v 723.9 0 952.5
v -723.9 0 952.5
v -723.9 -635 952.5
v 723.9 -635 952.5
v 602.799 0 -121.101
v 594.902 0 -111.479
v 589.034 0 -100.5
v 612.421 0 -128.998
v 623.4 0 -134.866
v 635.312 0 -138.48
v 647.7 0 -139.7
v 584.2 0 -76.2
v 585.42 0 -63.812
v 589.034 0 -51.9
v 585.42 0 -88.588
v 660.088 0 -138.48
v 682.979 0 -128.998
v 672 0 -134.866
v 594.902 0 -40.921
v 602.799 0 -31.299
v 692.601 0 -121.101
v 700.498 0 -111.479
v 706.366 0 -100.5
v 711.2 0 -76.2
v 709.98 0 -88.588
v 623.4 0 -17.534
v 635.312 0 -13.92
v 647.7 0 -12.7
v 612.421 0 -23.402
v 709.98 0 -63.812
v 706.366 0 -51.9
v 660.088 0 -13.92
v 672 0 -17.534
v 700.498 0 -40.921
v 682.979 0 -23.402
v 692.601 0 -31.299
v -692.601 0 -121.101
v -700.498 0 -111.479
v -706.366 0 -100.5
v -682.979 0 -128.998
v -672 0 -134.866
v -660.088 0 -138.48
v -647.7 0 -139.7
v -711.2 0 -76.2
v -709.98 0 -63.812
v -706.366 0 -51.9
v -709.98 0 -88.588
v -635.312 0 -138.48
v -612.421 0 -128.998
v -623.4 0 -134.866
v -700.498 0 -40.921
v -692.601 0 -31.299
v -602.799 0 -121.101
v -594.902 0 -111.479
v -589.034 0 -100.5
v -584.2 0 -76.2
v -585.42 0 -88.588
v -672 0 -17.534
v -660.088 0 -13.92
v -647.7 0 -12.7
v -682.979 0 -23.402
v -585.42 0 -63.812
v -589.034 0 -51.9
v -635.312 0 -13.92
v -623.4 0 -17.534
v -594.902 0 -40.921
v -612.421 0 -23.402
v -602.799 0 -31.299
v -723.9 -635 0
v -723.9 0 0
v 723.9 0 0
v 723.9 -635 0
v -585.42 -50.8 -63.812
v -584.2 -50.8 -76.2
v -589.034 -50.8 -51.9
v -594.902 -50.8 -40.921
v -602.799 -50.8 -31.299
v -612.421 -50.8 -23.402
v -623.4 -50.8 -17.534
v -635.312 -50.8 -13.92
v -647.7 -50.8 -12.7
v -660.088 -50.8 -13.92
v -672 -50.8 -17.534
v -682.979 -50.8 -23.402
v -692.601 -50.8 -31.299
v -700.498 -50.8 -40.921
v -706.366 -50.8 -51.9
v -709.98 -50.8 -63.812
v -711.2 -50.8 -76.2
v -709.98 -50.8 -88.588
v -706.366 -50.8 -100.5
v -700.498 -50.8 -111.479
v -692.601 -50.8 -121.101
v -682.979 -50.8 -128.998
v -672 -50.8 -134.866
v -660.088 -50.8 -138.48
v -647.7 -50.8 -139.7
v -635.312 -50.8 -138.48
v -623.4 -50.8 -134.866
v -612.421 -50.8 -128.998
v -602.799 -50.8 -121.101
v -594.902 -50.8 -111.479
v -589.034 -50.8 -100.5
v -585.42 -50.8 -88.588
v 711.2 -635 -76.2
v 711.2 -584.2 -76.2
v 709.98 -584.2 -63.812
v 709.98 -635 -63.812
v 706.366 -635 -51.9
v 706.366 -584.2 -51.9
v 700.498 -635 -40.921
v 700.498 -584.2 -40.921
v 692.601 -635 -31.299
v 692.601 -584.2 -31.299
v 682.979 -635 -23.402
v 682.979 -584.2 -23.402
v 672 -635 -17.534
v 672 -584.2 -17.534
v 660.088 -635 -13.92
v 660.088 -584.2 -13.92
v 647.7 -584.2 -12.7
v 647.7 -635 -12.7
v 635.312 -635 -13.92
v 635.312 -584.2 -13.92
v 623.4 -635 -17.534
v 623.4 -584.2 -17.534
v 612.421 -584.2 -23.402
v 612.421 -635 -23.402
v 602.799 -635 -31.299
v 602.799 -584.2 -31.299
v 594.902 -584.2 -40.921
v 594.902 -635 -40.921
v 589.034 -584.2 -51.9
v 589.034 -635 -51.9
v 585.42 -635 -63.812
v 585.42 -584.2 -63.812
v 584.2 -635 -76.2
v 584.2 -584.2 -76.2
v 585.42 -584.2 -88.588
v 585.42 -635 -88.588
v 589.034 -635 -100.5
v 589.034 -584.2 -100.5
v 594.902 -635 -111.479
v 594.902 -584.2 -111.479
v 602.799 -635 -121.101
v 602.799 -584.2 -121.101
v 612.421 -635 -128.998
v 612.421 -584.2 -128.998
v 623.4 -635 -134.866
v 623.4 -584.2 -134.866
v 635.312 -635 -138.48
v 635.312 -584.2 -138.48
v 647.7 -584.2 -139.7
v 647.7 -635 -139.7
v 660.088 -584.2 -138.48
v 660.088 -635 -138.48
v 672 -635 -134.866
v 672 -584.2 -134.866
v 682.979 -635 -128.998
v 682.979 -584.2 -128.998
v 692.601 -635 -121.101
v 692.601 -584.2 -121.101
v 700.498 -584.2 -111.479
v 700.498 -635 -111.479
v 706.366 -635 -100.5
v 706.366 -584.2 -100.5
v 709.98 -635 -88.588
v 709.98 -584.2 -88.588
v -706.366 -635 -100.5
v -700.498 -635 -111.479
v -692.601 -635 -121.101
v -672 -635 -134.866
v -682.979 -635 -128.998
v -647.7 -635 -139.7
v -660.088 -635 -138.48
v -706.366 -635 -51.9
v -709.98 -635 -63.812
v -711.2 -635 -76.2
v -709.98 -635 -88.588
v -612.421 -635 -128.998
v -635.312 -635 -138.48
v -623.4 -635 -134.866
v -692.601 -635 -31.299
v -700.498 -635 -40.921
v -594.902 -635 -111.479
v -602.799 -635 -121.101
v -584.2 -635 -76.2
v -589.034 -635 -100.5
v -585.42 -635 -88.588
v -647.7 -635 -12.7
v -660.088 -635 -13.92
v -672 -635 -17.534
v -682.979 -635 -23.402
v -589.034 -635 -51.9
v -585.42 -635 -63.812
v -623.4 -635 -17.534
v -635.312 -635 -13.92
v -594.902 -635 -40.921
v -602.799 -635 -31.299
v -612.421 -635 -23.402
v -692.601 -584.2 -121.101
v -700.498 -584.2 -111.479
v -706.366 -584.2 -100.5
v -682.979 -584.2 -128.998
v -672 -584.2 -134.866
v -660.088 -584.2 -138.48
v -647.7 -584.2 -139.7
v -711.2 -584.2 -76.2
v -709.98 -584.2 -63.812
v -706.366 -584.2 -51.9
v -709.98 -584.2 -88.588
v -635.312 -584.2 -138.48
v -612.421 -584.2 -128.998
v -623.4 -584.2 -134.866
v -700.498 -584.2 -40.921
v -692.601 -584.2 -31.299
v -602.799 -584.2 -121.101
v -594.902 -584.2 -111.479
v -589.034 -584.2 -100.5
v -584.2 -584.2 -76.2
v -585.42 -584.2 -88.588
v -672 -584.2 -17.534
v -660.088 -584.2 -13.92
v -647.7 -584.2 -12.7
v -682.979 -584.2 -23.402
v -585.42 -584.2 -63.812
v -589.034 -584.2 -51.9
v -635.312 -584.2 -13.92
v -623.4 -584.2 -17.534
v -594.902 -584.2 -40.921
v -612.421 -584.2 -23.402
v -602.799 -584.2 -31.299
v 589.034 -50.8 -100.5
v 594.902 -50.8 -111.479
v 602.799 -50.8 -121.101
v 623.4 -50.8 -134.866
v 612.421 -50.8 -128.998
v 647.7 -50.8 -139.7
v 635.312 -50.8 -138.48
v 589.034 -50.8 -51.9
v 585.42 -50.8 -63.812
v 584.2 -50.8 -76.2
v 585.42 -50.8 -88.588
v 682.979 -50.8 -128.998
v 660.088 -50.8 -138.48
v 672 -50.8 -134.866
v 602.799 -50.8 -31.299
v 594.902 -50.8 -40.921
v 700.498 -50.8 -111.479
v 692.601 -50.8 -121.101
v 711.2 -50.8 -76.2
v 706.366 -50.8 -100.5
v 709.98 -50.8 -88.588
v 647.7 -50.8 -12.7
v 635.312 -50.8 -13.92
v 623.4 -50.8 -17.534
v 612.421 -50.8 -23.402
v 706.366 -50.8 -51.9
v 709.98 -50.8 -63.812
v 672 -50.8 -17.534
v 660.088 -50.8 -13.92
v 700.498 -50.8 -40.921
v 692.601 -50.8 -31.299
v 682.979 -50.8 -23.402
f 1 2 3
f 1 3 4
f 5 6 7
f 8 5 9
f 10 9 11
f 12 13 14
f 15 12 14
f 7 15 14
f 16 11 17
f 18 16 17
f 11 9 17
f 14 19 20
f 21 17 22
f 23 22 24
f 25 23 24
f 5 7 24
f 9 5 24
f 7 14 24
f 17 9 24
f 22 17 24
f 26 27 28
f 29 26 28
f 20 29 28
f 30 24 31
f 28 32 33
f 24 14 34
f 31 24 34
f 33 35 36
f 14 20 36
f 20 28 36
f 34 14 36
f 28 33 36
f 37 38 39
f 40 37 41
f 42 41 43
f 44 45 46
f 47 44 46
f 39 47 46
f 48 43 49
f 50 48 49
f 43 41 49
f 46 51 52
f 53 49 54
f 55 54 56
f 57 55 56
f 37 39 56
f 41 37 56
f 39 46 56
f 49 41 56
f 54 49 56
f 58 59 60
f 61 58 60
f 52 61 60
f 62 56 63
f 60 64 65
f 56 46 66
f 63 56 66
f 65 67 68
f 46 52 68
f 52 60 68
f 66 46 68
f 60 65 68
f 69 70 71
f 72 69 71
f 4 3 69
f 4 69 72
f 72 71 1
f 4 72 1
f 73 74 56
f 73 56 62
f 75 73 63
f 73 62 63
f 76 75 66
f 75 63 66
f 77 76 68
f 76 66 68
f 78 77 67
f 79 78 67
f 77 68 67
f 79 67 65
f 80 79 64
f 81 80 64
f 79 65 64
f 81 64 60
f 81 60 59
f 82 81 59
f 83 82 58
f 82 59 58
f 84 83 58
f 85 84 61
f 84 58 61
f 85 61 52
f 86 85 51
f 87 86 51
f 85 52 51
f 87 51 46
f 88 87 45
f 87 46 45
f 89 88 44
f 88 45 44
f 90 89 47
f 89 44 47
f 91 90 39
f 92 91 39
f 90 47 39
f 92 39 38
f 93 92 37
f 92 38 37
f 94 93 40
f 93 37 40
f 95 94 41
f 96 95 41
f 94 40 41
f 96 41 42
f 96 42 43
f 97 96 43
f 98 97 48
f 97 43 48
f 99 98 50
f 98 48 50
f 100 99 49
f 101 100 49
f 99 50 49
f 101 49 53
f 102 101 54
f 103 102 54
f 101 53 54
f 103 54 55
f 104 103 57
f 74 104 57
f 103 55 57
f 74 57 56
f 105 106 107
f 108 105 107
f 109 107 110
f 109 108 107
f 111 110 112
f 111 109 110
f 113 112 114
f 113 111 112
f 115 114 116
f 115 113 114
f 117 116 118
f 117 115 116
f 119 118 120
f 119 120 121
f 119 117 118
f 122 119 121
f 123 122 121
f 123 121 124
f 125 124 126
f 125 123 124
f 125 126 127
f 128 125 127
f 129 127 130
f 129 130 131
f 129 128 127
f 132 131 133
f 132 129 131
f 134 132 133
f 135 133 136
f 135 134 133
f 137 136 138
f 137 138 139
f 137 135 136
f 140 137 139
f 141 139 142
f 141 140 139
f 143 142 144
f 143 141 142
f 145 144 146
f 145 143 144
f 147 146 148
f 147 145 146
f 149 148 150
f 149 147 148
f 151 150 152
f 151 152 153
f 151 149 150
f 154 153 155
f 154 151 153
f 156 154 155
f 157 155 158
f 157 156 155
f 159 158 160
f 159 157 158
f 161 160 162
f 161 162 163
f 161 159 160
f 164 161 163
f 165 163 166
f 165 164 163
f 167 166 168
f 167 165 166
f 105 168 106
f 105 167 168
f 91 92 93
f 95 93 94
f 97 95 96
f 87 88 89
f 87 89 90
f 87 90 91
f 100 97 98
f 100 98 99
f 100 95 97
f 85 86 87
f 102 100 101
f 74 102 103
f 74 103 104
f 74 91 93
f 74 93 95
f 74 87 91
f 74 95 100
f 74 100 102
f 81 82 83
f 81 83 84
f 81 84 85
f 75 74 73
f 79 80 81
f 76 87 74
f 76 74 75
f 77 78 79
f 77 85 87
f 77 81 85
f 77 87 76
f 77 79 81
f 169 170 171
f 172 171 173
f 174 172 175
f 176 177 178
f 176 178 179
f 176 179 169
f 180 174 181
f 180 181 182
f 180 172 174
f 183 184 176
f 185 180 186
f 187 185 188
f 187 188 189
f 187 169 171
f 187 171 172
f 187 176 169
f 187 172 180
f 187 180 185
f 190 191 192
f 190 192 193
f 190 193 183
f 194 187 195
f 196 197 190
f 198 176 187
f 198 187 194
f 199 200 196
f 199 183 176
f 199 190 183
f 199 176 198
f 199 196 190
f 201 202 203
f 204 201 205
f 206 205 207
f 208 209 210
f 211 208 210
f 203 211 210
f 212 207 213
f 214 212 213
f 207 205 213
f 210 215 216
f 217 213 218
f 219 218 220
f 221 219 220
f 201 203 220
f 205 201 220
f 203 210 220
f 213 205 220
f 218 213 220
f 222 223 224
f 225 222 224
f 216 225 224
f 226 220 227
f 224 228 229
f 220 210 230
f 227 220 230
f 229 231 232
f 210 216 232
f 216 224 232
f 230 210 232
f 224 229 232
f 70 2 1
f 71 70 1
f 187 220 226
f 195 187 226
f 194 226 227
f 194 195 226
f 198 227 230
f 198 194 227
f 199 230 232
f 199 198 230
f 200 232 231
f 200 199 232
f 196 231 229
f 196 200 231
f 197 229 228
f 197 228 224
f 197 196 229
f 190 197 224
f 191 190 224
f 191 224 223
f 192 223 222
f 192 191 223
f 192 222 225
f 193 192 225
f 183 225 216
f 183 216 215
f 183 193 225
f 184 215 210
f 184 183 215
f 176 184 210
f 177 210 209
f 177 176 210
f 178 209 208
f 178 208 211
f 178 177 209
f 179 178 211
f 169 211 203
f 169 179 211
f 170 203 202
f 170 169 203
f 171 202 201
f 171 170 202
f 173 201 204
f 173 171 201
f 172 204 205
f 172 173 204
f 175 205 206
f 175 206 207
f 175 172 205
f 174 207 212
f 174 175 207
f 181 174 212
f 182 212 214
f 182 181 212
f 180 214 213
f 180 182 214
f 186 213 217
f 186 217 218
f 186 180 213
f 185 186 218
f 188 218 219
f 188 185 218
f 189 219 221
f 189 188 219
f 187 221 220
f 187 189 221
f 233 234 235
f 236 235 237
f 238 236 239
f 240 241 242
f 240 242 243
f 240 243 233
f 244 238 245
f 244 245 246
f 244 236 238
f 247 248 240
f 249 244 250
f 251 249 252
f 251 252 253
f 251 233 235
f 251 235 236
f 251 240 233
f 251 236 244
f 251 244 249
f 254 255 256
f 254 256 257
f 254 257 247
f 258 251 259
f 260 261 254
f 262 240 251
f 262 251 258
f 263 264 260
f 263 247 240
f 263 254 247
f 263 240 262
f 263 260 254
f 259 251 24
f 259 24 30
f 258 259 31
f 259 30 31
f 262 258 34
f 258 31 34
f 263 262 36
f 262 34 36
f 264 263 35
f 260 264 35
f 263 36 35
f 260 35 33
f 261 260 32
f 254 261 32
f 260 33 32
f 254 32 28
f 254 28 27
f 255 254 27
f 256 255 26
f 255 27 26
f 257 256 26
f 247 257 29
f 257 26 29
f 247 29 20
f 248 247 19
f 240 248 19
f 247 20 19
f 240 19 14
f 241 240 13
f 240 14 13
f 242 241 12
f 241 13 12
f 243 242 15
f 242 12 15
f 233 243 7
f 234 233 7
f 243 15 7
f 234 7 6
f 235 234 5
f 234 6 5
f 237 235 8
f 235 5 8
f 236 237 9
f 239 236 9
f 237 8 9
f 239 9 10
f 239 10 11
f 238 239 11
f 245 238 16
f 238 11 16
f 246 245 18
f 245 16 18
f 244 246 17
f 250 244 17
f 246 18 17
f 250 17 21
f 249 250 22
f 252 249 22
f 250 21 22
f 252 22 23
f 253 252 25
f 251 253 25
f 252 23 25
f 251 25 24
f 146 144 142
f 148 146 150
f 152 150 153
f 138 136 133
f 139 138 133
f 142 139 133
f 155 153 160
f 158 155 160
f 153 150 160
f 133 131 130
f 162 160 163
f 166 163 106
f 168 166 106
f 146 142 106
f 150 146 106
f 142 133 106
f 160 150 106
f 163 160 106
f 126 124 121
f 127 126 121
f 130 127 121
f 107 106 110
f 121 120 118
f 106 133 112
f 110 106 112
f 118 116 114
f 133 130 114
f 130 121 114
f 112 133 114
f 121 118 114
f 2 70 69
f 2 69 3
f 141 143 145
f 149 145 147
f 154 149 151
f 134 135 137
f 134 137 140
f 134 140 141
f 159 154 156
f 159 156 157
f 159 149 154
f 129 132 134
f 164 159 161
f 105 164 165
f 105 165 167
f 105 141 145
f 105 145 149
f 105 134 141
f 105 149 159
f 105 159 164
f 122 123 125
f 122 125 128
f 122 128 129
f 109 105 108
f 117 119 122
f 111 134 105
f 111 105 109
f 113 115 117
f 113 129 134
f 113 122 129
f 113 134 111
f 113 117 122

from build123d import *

# Parameters (mm, degrees)
F0_W     = 1447.8
F0_H     = 952.5
F1_DEPTH = 635
F0_R     = 63.5
F2_DEPTH = 50.8


with BuildPart() as f1:
    # F0 (on Front) → F1 (new body)
    with BuildSketch(Plane.XZ):
        with Locations((0, 476.25)):
            Rectangle(F0_W, F0_H)
    extrude(amount=F1_DEPTH)


with BuildPart() as f2:
    # F0 (on Front) → F2 (new body)
    with BuildSketch(Plane.XZ):
        with Locations((647.7, -76.2)):
            Circle(F0_R)
    extrude(amount=F2_DEPTH)


with BuildPart() as f2b:
    # F0 (on Front) → F2, piece 2 (new body)
    with BuildSketch(Plane.XZ):
        with Locations((-647.7, -76.2)):
            Circle(F0_R)
    extrude(amount=F2_DEPTH)


with BuildPart() as f5_1:
    # F5: instance of F2
    add(f2.part.mirror(Plane.XZ.offset(317.5)))


with BuildPart() as f5_2:
    # F5: instance of F2b
    add(f2b.part.mirror(Plane.XZ.offset(317.5)))


solid = Compound([f1.part, f2.part, f2b.part, f5_1.part, f5_2.part])
